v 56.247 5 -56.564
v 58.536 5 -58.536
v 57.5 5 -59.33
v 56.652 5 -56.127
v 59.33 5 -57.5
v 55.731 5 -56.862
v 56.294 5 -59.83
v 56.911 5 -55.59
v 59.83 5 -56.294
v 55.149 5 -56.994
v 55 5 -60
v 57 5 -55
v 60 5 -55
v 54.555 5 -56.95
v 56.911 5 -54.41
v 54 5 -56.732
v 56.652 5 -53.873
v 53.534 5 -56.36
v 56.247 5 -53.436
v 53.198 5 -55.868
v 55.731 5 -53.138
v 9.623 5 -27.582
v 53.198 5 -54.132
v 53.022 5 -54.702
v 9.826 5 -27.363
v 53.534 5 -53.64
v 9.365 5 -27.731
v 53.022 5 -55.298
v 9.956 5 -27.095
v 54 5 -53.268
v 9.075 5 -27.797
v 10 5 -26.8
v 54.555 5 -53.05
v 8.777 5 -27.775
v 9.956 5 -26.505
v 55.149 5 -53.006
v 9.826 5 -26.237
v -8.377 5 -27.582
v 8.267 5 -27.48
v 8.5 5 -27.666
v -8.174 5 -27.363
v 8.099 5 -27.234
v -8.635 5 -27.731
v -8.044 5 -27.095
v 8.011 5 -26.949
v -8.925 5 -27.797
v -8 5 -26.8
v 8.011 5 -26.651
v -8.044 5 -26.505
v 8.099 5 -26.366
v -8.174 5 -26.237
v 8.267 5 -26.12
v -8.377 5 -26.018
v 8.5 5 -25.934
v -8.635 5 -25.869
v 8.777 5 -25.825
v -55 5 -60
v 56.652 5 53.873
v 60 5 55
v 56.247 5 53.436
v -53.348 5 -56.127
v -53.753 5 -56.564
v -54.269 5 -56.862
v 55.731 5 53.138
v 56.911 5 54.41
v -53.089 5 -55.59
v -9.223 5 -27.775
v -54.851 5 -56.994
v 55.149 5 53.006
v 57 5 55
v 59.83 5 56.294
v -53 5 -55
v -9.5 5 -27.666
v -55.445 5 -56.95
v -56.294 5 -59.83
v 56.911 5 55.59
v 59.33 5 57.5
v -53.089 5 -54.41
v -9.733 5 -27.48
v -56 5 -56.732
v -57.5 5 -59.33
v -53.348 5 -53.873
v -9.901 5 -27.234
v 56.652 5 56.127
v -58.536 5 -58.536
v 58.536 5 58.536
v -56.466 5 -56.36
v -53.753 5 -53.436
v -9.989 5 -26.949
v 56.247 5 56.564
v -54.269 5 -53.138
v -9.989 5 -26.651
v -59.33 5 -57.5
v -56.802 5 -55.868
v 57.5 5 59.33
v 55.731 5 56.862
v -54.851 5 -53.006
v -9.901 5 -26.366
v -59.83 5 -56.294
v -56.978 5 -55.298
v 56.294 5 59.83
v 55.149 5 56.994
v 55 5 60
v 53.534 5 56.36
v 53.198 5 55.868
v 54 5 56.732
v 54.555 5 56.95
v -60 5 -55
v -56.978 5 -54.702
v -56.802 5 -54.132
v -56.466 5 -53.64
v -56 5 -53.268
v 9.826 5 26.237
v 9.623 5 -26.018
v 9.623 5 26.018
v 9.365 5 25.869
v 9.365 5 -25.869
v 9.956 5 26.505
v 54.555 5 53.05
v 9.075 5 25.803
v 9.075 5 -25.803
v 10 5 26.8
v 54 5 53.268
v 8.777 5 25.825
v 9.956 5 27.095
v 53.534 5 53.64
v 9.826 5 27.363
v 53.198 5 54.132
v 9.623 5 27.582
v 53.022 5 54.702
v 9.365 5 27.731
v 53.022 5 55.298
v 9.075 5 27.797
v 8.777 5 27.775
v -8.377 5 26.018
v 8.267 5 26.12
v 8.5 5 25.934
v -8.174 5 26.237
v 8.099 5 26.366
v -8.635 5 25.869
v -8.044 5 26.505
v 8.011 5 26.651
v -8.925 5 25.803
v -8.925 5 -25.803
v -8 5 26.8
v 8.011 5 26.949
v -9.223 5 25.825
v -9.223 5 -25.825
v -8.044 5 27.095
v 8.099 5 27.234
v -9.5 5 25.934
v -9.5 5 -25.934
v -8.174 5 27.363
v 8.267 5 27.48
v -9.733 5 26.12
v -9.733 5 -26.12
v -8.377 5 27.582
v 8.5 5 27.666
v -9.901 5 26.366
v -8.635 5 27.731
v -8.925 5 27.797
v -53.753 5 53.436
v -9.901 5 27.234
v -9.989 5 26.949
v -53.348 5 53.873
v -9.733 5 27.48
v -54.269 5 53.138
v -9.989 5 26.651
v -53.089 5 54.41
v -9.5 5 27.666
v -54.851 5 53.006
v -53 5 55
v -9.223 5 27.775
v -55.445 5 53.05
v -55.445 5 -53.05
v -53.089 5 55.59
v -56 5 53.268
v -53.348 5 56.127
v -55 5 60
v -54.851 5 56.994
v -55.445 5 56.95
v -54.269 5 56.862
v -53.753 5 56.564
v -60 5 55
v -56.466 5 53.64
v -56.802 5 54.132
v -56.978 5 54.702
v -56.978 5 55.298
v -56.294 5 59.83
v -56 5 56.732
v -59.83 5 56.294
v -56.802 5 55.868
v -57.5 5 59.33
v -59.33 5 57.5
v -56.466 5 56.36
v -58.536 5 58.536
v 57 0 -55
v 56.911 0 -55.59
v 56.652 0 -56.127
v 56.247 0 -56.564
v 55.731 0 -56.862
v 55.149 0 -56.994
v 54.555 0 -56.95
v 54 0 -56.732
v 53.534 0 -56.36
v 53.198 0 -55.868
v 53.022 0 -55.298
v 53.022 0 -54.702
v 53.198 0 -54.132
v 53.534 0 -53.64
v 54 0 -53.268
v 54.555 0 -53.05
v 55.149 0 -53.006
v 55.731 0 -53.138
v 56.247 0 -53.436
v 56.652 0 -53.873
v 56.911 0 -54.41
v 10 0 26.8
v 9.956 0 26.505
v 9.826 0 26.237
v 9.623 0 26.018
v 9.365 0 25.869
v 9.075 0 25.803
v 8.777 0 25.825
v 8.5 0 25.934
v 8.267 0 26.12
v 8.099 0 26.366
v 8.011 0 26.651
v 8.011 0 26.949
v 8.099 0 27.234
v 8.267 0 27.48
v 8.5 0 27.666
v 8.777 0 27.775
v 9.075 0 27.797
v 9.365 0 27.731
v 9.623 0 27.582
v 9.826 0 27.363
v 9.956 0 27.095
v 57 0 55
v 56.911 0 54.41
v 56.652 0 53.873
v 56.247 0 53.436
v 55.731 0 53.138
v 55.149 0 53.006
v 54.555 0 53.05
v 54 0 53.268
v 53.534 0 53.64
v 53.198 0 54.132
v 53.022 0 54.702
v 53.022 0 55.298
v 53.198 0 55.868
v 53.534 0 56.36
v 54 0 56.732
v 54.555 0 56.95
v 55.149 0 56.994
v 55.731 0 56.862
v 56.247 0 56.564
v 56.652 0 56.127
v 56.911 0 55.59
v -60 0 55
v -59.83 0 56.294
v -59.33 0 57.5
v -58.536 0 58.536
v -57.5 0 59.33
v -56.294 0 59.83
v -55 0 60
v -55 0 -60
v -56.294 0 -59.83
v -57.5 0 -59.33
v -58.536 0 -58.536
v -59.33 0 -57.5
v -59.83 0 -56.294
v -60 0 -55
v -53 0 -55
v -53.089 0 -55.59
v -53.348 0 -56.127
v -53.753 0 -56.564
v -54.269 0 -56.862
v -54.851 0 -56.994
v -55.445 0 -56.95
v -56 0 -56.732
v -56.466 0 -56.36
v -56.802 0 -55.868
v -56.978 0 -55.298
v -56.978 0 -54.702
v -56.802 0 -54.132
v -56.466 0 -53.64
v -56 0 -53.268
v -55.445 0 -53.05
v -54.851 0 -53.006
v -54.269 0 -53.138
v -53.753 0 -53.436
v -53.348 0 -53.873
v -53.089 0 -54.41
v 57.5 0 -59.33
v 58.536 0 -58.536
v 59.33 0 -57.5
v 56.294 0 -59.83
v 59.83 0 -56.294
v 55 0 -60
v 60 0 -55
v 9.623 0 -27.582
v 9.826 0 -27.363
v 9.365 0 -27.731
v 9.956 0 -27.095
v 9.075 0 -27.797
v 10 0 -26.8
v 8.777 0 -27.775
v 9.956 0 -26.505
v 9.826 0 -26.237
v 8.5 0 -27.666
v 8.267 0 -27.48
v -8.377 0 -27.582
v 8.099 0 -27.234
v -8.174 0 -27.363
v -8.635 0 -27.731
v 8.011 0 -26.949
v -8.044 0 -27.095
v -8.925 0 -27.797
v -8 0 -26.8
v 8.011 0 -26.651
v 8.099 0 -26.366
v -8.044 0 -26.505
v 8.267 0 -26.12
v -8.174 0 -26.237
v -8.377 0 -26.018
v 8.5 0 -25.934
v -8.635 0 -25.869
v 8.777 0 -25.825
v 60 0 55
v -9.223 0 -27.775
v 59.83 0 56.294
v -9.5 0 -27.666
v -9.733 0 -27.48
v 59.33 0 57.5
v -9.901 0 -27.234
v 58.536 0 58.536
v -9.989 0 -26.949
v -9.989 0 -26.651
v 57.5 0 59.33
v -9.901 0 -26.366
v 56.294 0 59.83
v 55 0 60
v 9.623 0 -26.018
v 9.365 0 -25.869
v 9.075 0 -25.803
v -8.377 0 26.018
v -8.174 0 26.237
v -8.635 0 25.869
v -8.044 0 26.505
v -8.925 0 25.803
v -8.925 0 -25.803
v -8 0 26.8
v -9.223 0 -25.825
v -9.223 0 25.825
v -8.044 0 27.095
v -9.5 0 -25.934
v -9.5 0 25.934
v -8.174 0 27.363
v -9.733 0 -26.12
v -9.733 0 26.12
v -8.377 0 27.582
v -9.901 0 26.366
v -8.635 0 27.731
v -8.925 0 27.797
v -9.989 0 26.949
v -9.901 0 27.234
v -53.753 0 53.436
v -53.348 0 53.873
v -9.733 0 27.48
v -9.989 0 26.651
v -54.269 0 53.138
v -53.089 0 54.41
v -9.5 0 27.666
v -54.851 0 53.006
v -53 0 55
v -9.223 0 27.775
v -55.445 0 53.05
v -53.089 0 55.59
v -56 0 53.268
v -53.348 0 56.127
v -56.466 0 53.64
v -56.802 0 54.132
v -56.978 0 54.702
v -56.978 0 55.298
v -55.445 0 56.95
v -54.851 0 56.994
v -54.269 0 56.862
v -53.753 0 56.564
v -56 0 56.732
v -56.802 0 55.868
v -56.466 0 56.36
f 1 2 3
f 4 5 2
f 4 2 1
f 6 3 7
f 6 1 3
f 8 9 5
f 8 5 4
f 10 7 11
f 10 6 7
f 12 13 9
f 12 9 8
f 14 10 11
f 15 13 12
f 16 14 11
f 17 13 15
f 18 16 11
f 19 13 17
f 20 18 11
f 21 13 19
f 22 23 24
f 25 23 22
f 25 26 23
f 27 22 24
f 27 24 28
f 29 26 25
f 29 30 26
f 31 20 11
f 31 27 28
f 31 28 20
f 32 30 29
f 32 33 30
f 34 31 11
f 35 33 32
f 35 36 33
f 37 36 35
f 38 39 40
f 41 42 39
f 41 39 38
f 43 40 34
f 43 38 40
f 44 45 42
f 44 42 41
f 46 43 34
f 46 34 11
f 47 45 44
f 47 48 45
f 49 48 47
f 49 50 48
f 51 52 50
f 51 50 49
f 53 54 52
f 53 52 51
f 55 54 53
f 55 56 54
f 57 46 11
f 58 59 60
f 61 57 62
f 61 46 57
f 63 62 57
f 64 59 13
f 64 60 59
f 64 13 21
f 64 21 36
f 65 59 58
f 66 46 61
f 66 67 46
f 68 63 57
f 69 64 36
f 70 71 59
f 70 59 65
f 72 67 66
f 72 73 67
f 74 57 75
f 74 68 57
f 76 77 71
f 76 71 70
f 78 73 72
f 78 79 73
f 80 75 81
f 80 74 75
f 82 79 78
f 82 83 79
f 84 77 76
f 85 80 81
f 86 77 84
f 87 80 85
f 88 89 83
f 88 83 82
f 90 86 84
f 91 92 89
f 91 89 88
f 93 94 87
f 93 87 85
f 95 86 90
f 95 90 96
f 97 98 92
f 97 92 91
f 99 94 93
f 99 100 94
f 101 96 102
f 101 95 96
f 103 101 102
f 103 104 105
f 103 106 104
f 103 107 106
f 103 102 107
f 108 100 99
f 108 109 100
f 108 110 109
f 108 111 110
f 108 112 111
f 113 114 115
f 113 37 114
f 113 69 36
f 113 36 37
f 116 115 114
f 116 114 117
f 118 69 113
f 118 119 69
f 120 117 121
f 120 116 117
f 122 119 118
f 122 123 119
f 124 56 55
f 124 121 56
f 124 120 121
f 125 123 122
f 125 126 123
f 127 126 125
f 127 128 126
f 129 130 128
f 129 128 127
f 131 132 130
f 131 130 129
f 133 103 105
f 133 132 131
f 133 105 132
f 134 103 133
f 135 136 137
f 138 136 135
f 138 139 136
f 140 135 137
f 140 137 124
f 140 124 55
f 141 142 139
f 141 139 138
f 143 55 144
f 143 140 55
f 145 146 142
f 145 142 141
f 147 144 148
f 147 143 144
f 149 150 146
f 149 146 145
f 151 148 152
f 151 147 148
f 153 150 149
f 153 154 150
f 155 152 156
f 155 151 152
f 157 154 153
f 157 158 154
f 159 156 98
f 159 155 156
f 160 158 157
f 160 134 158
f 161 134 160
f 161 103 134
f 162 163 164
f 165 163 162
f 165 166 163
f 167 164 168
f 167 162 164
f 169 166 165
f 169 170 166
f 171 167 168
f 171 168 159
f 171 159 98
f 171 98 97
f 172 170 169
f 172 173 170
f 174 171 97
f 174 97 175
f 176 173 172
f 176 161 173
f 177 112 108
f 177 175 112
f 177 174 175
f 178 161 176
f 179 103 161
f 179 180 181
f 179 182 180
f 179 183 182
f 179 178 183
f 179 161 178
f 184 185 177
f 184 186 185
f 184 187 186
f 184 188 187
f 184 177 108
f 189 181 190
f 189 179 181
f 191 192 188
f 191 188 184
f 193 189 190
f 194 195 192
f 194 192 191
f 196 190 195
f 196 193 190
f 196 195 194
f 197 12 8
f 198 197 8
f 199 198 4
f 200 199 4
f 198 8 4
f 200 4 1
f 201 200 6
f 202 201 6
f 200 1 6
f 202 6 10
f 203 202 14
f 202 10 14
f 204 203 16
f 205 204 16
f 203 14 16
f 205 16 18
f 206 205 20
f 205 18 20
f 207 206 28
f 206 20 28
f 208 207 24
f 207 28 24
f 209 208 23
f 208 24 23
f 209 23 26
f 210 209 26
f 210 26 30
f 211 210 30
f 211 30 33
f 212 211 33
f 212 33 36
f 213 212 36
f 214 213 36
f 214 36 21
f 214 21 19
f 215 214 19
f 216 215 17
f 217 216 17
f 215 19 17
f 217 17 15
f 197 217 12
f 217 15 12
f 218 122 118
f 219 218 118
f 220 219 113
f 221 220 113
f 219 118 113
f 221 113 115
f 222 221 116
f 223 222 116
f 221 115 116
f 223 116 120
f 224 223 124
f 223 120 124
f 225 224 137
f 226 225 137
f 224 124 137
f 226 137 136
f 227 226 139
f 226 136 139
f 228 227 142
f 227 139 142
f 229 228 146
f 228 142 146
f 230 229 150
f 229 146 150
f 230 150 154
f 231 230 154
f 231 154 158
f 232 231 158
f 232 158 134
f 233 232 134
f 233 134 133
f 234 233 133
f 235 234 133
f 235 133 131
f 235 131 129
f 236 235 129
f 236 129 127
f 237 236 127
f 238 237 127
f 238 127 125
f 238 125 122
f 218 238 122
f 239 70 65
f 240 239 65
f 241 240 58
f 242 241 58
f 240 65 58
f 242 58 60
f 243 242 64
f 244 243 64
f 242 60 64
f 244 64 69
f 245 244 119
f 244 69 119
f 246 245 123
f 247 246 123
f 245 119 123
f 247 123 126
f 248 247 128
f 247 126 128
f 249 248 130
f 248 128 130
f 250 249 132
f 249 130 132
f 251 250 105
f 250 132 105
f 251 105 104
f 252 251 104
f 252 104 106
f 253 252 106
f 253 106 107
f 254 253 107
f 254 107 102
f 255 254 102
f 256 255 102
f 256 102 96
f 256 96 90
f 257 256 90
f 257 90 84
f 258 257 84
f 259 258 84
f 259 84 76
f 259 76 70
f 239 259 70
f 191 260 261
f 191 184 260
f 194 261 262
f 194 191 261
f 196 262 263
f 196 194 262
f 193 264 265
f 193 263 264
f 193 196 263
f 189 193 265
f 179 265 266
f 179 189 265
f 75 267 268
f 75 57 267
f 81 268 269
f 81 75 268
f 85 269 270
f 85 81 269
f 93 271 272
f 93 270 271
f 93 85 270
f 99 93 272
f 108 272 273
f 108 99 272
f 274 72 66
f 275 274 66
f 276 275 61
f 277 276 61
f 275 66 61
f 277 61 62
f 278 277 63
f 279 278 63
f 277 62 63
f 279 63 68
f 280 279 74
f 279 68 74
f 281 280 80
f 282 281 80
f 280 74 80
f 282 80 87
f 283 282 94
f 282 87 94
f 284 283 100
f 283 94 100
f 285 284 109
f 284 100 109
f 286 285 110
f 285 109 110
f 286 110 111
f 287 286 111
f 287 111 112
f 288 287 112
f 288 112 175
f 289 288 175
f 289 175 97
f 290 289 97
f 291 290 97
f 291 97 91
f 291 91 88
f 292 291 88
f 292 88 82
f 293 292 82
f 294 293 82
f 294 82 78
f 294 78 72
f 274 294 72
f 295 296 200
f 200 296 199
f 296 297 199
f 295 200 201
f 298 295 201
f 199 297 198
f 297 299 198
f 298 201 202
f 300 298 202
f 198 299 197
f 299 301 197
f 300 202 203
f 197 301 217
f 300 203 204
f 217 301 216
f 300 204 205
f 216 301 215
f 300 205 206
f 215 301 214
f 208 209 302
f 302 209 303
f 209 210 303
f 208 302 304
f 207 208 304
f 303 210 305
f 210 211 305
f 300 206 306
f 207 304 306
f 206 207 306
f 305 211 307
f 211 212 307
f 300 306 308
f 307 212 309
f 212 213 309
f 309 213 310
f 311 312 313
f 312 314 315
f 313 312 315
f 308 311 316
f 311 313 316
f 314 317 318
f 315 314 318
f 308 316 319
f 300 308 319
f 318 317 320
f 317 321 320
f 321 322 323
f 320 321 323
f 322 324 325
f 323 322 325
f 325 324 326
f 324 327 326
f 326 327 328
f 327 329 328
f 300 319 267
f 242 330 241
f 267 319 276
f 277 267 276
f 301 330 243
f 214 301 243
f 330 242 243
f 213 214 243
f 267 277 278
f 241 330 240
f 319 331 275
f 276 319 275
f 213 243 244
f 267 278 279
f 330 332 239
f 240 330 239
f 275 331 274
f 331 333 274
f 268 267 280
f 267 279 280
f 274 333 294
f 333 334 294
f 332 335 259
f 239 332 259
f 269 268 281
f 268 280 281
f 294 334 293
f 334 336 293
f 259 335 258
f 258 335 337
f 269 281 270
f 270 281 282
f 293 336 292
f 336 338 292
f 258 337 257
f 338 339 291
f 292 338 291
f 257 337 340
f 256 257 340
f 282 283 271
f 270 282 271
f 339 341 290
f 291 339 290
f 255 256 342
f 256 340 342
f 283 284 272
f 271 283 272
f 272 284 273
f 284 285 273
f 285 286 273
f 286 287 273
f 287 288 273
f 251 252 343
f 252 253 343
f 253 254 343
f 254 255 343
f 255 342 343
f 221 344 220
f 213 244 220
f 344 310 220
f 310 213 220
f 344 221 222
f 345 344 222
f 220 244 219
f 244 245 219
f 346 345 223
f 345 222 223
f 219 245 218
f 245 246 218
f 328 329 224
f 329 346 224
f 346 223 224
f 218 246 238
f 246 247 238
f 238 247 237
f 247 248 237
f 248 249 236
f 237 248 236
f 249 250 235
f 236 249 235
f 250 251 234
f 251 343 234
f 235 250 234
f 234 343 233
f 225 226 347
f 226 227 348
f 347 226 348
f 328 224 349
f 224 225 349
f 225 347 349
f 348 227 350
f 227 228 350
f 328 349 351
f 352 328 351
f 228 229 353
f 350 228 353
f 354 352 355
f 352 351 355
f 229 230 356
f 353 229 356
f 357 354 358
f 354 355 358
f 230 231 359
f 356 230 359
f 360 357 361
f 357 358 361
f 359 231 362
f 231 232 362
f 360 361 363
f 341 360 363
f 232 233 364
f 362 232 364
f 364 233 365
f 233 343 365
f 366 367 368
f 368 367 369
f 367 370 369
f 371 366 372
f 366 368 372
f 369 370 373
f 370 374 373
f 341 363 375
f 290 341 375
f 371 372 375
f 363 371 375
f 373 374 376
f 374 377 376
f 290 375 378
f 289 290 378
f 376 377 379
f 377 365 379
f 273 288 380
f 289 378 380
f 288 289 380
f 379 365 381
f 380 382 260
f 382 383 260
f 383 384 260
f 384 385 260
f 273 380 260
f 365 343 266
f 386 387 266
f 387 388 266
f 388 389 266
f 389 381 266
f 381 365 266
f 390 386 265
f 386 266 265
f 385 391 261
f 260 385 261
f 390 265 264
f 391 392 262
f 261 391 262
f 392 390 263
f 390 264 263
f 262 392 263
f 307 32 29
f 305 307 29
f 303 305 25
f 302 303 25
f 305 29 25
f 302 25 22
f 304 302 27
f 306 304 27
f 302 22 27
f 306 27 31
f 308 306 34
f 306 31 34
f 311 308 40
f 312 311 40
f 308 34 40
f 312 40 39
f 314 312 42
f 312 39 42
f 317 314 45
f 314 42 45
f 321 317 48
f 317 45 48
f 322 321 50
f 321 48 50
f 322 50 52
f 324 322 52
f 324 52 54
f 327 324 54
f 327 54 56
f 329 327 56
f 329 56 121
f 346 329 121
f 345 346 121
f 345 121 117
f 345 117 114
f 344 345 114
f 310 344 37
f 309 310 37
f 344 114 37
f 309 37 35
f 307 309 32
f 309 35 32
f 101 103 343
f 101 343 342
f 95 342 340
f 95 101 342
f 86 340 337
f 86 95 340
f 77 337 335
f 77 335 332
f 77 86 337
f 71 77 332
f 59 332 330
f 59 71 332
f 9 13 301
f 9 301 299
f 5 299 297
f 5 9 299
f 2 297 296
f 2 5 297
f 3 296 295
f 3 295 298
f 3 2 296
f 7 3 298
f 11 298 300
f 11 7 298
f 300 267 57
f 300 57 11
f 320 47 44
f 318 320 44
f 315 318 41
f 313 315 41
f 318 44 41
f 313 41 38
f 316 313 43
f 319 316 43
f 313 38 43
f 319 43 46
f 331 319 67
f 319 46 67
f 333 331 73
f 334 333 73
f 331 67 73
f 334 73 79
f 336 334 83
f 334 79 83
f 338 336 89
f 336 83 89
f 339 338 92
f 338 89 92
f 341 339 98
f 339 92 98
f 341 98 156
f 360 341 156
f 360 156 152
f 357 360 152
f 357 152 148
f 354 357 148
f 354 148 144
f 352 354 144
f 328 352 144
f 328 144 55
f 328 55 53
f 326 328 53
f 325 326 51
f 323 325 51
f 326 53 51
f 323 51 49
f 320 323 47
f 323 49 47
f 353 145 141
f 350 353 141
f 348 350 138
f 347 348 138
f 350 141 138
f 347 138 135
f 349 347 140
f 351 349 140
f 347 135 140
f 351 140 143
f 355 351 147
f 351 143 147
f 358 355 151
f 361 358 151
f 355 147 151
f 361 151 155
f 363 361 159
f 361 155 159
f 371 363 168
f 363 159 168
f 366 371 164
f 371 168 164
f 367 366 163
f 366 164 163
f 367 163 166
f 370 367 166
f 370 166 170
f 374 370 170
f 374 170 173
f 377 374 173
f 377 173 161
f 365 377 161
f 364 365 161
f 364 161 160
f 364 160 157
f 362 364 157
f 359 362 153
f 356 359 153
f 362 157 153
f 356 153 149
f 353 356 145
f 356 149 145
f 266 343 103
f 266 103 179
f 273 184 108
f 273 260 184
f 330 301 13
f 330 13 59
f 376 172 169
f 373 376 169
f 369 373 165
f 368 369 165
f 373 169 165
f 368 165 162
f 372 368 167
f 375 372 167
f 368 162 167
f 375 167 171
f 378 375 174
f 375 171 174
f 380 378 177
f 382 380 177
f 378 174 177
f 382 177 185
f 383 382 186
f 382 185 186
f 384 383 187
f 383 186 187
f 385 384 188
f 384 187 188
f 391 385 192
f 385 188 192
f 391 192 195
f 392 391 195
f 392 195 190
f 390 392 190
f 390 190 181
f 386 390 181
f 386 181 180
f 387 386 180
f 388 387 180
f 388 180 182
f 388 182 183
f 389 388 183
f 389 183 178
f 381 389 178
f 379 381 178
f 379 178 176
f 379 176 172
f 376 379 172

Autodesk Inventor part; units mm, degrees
ref_plane "YZ Plane" through (0, 0, 0) normal (1, 0, 0) x (0, 1, 0)
ref_plane "XZ Plane" through (0, 0, 0) normal (0, 1, 0) x (-1, 0, 0)
ref_plane "XY Plane" through (0, 0, 0) normal (0, 0, 1) x (1, 0, 0)
sketch "Sketch1" plane through (0, 0, 0) normal (0, 1, 0) x (-1, 0, 0)
  line L0 (-60, 60) -> (60, 60)
  line L1 (60, 60) -> (60, -60)
  line L2 (60, -60) -> (-60, -60)
  line L3 (-60, -60) -> (-60, 60)
  line L4 (-60, 60) -> (60, -60) construction
  line L5 (60, 60) -> (-60, -60) construction
  point P0 (0, 0)
  dimension "d0" = 120
  dimension "d1" = 120
extrude "Extrusion1" add sketch "Sketch1" along normal blind 5
sketch "Sketch2" plane through (0, 5, 0) normal (0, 1, 0) x (1, 0, 0)
  line L0 (55, -55) -> (-55, -55) construction
  line L1 (-55, -55) -> (-55, 55) construction
  line L2 (-55, 55) -> (55, 55) construction
  line L3 (55, 55) -> (55, -55) construction
  line L4 (55, -55) -> (-55, 55) construction
  line L5 (-55, -55) -> (55, 55) construction
  circle A0 centre (-55, 55) radius 2
  circle A1 centre (-55, -55) radius 2
  circle A2 centre (55, 55) radius 2
  circle A3 centre (55, -55) radius 2
  point P0 (0, 0)
  dimension "d4" = 110
  dimension "d5" = 110
  dimension "d6" = 4
  dimension "d7" = 4
  dimension "d8" = 4
  dimension "d9" = 4
extrude "Extrusion2" cut sketch "Sketch2" against normal blind 5
fillet "Fillet1" radius 5 4 edges at (60, 2.5, -60) (60, 2.5, 60) (-60, 2.5, -60) (-60, 2.5, 60)
sketch "Sketch3" plane through (0, 5, 0) normal (0, 1, 0) x (1, 0, 0)
  line L0 (-35.5, -35.5) -> (35.5, -35.5) construction
  line L1 (35.5, -35.5) -> (35.5, 35.5) construction
  line L2 (35.5, 35.5) -> (-35.5, 35.5) construction
  line L3 (-35.5, 35.5) -> (-35.5, -35.5) construction
  line L4 (-35.5, -35.5) -> (35.5, 35.5) construction
  line L5 (35.5, -35.5) -> (-35.5, 35.5) construction
  circle A0 centre (9, 26.8) radius 1
  circle A1 centre (-9, 26.8) radius 1
  circle A2 centre (-9, -26.8) radius 1
  circle A3 centre (9, -26.8) radius 1
  point P0 (0, 0)
  dimension "d13" = 71
  dimension "d14" = 71
  dimension "d15" = 26.5
  dimension "d16" = 8.7
  dimension "d17" = 2
  dimension "d18" = 8.7
  dimension "d19" = 2
  dimension "d20" = 26.5
  dimension "d21" = 26.5
  dimension "d22" = 26.5
  dimension "d23" = 8.7
  dimension "d24" = 2
  dimension "d25" = 8.7
  dimension "d26" = 2
extrude "Extrusion3" cut sketch "Sketch3" against normal blind 10
properties part number "Arena"
